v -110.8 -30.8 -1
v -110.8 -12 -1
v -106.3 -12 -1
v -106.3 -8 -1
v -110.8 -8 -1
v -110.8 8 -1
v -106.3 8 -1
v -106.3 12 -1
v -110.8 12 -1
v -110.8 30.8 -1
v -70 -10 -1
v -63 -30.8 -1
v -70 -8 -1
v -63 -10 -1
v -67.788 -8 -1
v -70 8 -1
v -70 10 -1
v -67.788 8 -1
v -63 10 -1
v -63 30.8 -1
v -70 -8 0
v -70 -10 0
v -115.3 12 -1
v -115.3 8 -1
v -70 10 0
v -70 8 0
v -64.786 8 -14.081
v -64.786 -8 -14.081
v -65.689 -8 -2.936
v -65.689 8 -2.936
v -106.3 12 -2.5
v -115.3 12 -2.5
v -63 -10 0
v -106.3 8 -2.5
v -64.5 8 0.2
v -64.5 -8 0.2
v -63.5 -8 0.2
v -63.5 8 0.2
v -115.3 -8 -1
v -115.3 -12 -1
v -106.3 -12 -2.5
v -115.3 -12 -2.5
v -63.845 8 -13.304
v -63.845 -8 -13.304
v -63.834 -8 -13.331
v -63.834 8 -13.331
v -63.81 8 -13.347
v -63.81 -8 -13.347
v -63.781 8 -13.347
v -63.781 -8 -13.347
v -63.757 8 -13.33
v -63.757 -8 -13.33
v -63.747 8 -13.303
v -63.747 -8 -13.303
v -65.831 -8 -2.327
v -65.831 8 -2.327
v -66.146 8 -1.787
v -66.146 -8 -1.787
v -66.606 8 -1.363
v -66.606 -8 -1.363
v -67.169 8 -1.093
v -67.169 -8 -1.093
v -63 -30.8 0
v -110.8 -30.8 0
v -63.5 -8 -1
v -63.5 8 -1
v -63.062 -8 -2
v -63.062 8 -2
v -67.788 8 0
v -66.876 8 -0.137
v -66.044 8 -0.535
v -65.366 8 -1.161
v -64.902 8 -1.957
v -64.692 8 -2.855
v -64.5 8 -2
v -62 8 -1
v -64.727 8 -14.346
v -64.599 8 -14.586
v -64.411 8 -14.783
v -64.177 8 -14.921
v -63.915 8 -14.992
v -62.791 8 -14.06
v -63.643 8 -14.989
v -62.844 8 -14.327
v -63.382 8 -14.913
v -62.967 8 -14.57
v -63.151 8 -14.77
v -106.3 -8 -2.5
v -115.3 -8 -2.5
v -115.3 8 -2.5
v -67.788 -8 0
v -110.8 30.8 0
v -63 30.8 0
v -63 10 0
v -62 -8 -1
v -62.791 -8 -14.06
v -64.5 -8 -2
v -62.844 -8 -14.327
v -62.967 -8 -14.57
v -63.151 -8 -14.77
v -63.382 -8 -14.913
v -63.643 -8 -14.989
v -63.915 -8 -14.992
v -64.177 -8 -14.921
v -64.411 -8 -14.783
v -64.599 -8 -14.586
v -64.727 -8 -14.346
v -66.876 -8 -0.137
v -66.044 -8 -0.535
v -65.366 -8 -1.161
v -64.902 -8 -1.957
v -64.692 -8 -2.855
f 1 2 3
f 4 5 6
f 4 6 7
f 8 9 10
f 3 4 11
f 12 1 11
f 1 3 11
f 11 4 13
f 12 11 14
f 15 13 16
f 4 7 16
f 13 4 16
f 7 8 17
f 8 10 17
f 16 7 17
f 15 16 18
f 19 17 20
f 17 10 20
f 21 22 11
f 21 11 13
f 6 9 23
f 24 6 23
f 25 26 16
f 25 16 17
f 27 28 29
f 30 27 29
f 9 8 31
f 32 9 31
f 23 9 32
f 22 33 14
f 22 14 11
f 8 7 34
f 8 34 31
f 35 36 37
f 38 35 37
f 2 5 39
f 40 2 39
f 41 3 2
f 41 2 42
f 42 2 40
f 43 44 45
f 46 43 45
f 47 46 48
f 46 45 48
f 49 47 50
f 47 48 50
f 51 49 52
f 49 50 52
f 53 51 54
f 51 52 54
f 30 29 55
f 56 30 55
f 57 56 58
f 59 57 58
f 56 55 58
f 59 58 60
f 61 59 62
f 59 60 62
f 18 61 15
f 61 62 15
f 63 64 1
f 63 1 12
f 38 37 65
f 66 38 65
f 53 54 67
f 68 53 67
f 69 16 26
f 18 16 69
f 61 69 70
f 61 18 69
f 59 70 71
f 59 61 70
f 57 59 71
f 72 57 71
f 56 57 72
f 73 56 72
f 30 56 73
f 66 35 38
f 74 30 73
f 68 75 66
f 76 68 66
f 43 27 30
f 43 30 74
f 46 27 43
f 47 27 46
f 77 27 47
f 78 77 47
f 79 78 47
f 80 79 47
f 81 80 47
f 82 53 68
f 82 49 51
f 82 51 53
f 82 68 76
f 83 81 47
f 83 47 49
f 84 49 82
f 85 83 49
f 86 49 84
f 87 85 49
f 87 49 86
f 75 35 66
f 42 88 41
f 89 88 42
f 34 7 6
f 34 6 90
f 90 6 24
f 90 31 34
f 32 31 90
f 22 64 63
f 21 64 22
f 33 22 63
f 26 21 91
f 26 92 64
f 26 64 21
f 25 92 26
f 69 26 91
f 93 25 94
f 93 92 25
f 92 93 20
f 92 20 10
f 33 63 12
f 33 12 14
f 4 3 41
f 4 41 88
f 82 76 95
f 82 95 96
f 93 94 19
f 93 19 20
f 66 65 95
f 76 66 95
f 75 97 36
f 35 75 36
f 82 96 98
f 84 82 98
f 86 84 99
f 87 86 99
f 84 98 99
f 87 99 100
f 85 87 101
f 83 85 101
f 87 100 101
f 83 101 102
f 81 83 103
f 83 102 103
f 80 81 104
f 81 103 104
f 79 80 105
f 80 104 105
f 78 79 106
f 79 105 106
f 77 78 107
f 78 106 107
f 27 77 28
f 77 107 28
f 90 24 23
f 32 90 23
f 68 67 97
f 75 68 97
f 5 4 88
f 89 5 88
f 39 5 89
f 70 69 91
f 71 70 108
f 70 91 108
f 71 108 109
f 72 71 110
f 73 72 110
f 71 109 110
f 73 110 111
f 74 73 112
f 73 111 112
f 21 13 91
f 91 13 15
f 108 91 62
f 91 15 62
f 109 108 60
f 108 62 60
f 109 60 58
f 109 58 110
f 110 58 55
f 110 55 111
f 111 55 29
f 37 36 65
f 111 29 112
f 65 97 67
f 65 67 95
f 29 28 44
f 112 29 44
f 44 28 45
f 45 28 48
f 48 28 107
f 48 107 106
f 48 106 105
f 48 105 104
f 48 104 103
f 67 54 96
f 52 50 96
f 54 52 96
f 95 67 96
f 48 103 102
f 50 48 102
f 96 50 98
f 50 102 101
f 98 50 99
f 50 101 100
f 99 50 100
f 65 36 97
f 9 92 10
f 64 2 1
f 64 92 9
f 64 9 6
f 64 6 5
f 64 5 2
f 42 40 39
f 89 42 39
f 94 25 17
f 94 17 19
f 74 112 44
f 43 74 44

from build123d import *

# Parameters (mm, degrees)
BOSS_EXTRUDE1_DEPTH      = 1
SKETCH2_W                = 9
SKETCH2_H                = 4
BOSS_EXTRUDE2_DEPTH      = 1.5
BOSS_EXTRUDE5_DEPTH      = 8
BOSS_EXTRUDE5_DEPTH_BACK = 8


with BuildPart() as part:
    # Sketch1 → Boss-Extrude1 (new body)
    with BuildSketch(Plane.XY):
        Polygon((-63, -10), (-70, -10), (-70, 10), (-63, 10), (-63, 30.8), (-110.8, 30.8), (-110.8, -30.8), (-63, -30.8), align=None)
    extrude(amount=-BOSS_EXTRUDE1_DEPTH)

    # Sketch2 → Boss-Extrude2 (add)
    with BuildSketch(Plane(origin=(0, 0, -1), x_dir=(-1, 0, 0), z_dir=(0, 0, -1))):
        with Locations((110.8, -10)):
            Rectangle(SKETCH2_W, SKETCH2_H)
        with Locations((110.8, 10)):
            Rectangle(SKETCH2_W, SKETCH2_H)
    extrude(amount=BOSS_EXTRUDE2_DEPTH)

    # Sketch4 → Boss-Extrude5 (add, two sides: drawn at the far end of the back side and taken through both)
    with BuildSketch(Plane(origin=(0, 0, 0), x_dir=(1, 0, 0), z_dir=(0, 1, 0)).offset(-BOSS_EXTRUDE5_DEPTH_BACK)):
        with BuildLine():
            Line((-63.746646239, 13.303022537), (-63.062370045, 2))
            Line((-63.062370045, 2), (-64.5, 2))
            Line((-64.5, 2), (-64.5, -0.2))
            Line((-64.5, -0.2), (-63.5, -0.2))
            Line((-63.5, -0.2), (-63.5, 1))
            Line((-63.5, 1), (-62, 1))
            Line((-62, 1), (-62.790668189, 14.060428588))
            ThreePointArc((-62.790668189, 14.060428588), (-63.7786518, 14.999948092), (-64.785574648, 14.080755571))
            Line((-64.785574648, 14.080755571), (-65.688532626, 2.935903953))
            ThreePointArc((-65.688532626, 2.935903953), (-66.359873651, 1.557863976), (-67.787627389, 1))
            Line((-67.787627389, 1), (-70, 1))
            Line((-70, 1), (-70, 0))
            Line((-70, 0), (-67.787627389, 0))
            ThreePointArc((-67.787627389, 0), (-65.681919218, 0.822760048), (-64.691798691, 2.855148382))
            Line((-64.691798691, 2.855148382), (-63.845228573, 13.304027036))
            ThreePointArc((-63.845228573, 13.304027036), (-63.795469446, 13.349450792), (-63.746646239, 13.303022537))
        make_face()
    extrude(amount=BOSS_EXTRUDE5_DEPTH + BOSS_EXTRUDE5_DEPTH_BACK)


solid = part.part
